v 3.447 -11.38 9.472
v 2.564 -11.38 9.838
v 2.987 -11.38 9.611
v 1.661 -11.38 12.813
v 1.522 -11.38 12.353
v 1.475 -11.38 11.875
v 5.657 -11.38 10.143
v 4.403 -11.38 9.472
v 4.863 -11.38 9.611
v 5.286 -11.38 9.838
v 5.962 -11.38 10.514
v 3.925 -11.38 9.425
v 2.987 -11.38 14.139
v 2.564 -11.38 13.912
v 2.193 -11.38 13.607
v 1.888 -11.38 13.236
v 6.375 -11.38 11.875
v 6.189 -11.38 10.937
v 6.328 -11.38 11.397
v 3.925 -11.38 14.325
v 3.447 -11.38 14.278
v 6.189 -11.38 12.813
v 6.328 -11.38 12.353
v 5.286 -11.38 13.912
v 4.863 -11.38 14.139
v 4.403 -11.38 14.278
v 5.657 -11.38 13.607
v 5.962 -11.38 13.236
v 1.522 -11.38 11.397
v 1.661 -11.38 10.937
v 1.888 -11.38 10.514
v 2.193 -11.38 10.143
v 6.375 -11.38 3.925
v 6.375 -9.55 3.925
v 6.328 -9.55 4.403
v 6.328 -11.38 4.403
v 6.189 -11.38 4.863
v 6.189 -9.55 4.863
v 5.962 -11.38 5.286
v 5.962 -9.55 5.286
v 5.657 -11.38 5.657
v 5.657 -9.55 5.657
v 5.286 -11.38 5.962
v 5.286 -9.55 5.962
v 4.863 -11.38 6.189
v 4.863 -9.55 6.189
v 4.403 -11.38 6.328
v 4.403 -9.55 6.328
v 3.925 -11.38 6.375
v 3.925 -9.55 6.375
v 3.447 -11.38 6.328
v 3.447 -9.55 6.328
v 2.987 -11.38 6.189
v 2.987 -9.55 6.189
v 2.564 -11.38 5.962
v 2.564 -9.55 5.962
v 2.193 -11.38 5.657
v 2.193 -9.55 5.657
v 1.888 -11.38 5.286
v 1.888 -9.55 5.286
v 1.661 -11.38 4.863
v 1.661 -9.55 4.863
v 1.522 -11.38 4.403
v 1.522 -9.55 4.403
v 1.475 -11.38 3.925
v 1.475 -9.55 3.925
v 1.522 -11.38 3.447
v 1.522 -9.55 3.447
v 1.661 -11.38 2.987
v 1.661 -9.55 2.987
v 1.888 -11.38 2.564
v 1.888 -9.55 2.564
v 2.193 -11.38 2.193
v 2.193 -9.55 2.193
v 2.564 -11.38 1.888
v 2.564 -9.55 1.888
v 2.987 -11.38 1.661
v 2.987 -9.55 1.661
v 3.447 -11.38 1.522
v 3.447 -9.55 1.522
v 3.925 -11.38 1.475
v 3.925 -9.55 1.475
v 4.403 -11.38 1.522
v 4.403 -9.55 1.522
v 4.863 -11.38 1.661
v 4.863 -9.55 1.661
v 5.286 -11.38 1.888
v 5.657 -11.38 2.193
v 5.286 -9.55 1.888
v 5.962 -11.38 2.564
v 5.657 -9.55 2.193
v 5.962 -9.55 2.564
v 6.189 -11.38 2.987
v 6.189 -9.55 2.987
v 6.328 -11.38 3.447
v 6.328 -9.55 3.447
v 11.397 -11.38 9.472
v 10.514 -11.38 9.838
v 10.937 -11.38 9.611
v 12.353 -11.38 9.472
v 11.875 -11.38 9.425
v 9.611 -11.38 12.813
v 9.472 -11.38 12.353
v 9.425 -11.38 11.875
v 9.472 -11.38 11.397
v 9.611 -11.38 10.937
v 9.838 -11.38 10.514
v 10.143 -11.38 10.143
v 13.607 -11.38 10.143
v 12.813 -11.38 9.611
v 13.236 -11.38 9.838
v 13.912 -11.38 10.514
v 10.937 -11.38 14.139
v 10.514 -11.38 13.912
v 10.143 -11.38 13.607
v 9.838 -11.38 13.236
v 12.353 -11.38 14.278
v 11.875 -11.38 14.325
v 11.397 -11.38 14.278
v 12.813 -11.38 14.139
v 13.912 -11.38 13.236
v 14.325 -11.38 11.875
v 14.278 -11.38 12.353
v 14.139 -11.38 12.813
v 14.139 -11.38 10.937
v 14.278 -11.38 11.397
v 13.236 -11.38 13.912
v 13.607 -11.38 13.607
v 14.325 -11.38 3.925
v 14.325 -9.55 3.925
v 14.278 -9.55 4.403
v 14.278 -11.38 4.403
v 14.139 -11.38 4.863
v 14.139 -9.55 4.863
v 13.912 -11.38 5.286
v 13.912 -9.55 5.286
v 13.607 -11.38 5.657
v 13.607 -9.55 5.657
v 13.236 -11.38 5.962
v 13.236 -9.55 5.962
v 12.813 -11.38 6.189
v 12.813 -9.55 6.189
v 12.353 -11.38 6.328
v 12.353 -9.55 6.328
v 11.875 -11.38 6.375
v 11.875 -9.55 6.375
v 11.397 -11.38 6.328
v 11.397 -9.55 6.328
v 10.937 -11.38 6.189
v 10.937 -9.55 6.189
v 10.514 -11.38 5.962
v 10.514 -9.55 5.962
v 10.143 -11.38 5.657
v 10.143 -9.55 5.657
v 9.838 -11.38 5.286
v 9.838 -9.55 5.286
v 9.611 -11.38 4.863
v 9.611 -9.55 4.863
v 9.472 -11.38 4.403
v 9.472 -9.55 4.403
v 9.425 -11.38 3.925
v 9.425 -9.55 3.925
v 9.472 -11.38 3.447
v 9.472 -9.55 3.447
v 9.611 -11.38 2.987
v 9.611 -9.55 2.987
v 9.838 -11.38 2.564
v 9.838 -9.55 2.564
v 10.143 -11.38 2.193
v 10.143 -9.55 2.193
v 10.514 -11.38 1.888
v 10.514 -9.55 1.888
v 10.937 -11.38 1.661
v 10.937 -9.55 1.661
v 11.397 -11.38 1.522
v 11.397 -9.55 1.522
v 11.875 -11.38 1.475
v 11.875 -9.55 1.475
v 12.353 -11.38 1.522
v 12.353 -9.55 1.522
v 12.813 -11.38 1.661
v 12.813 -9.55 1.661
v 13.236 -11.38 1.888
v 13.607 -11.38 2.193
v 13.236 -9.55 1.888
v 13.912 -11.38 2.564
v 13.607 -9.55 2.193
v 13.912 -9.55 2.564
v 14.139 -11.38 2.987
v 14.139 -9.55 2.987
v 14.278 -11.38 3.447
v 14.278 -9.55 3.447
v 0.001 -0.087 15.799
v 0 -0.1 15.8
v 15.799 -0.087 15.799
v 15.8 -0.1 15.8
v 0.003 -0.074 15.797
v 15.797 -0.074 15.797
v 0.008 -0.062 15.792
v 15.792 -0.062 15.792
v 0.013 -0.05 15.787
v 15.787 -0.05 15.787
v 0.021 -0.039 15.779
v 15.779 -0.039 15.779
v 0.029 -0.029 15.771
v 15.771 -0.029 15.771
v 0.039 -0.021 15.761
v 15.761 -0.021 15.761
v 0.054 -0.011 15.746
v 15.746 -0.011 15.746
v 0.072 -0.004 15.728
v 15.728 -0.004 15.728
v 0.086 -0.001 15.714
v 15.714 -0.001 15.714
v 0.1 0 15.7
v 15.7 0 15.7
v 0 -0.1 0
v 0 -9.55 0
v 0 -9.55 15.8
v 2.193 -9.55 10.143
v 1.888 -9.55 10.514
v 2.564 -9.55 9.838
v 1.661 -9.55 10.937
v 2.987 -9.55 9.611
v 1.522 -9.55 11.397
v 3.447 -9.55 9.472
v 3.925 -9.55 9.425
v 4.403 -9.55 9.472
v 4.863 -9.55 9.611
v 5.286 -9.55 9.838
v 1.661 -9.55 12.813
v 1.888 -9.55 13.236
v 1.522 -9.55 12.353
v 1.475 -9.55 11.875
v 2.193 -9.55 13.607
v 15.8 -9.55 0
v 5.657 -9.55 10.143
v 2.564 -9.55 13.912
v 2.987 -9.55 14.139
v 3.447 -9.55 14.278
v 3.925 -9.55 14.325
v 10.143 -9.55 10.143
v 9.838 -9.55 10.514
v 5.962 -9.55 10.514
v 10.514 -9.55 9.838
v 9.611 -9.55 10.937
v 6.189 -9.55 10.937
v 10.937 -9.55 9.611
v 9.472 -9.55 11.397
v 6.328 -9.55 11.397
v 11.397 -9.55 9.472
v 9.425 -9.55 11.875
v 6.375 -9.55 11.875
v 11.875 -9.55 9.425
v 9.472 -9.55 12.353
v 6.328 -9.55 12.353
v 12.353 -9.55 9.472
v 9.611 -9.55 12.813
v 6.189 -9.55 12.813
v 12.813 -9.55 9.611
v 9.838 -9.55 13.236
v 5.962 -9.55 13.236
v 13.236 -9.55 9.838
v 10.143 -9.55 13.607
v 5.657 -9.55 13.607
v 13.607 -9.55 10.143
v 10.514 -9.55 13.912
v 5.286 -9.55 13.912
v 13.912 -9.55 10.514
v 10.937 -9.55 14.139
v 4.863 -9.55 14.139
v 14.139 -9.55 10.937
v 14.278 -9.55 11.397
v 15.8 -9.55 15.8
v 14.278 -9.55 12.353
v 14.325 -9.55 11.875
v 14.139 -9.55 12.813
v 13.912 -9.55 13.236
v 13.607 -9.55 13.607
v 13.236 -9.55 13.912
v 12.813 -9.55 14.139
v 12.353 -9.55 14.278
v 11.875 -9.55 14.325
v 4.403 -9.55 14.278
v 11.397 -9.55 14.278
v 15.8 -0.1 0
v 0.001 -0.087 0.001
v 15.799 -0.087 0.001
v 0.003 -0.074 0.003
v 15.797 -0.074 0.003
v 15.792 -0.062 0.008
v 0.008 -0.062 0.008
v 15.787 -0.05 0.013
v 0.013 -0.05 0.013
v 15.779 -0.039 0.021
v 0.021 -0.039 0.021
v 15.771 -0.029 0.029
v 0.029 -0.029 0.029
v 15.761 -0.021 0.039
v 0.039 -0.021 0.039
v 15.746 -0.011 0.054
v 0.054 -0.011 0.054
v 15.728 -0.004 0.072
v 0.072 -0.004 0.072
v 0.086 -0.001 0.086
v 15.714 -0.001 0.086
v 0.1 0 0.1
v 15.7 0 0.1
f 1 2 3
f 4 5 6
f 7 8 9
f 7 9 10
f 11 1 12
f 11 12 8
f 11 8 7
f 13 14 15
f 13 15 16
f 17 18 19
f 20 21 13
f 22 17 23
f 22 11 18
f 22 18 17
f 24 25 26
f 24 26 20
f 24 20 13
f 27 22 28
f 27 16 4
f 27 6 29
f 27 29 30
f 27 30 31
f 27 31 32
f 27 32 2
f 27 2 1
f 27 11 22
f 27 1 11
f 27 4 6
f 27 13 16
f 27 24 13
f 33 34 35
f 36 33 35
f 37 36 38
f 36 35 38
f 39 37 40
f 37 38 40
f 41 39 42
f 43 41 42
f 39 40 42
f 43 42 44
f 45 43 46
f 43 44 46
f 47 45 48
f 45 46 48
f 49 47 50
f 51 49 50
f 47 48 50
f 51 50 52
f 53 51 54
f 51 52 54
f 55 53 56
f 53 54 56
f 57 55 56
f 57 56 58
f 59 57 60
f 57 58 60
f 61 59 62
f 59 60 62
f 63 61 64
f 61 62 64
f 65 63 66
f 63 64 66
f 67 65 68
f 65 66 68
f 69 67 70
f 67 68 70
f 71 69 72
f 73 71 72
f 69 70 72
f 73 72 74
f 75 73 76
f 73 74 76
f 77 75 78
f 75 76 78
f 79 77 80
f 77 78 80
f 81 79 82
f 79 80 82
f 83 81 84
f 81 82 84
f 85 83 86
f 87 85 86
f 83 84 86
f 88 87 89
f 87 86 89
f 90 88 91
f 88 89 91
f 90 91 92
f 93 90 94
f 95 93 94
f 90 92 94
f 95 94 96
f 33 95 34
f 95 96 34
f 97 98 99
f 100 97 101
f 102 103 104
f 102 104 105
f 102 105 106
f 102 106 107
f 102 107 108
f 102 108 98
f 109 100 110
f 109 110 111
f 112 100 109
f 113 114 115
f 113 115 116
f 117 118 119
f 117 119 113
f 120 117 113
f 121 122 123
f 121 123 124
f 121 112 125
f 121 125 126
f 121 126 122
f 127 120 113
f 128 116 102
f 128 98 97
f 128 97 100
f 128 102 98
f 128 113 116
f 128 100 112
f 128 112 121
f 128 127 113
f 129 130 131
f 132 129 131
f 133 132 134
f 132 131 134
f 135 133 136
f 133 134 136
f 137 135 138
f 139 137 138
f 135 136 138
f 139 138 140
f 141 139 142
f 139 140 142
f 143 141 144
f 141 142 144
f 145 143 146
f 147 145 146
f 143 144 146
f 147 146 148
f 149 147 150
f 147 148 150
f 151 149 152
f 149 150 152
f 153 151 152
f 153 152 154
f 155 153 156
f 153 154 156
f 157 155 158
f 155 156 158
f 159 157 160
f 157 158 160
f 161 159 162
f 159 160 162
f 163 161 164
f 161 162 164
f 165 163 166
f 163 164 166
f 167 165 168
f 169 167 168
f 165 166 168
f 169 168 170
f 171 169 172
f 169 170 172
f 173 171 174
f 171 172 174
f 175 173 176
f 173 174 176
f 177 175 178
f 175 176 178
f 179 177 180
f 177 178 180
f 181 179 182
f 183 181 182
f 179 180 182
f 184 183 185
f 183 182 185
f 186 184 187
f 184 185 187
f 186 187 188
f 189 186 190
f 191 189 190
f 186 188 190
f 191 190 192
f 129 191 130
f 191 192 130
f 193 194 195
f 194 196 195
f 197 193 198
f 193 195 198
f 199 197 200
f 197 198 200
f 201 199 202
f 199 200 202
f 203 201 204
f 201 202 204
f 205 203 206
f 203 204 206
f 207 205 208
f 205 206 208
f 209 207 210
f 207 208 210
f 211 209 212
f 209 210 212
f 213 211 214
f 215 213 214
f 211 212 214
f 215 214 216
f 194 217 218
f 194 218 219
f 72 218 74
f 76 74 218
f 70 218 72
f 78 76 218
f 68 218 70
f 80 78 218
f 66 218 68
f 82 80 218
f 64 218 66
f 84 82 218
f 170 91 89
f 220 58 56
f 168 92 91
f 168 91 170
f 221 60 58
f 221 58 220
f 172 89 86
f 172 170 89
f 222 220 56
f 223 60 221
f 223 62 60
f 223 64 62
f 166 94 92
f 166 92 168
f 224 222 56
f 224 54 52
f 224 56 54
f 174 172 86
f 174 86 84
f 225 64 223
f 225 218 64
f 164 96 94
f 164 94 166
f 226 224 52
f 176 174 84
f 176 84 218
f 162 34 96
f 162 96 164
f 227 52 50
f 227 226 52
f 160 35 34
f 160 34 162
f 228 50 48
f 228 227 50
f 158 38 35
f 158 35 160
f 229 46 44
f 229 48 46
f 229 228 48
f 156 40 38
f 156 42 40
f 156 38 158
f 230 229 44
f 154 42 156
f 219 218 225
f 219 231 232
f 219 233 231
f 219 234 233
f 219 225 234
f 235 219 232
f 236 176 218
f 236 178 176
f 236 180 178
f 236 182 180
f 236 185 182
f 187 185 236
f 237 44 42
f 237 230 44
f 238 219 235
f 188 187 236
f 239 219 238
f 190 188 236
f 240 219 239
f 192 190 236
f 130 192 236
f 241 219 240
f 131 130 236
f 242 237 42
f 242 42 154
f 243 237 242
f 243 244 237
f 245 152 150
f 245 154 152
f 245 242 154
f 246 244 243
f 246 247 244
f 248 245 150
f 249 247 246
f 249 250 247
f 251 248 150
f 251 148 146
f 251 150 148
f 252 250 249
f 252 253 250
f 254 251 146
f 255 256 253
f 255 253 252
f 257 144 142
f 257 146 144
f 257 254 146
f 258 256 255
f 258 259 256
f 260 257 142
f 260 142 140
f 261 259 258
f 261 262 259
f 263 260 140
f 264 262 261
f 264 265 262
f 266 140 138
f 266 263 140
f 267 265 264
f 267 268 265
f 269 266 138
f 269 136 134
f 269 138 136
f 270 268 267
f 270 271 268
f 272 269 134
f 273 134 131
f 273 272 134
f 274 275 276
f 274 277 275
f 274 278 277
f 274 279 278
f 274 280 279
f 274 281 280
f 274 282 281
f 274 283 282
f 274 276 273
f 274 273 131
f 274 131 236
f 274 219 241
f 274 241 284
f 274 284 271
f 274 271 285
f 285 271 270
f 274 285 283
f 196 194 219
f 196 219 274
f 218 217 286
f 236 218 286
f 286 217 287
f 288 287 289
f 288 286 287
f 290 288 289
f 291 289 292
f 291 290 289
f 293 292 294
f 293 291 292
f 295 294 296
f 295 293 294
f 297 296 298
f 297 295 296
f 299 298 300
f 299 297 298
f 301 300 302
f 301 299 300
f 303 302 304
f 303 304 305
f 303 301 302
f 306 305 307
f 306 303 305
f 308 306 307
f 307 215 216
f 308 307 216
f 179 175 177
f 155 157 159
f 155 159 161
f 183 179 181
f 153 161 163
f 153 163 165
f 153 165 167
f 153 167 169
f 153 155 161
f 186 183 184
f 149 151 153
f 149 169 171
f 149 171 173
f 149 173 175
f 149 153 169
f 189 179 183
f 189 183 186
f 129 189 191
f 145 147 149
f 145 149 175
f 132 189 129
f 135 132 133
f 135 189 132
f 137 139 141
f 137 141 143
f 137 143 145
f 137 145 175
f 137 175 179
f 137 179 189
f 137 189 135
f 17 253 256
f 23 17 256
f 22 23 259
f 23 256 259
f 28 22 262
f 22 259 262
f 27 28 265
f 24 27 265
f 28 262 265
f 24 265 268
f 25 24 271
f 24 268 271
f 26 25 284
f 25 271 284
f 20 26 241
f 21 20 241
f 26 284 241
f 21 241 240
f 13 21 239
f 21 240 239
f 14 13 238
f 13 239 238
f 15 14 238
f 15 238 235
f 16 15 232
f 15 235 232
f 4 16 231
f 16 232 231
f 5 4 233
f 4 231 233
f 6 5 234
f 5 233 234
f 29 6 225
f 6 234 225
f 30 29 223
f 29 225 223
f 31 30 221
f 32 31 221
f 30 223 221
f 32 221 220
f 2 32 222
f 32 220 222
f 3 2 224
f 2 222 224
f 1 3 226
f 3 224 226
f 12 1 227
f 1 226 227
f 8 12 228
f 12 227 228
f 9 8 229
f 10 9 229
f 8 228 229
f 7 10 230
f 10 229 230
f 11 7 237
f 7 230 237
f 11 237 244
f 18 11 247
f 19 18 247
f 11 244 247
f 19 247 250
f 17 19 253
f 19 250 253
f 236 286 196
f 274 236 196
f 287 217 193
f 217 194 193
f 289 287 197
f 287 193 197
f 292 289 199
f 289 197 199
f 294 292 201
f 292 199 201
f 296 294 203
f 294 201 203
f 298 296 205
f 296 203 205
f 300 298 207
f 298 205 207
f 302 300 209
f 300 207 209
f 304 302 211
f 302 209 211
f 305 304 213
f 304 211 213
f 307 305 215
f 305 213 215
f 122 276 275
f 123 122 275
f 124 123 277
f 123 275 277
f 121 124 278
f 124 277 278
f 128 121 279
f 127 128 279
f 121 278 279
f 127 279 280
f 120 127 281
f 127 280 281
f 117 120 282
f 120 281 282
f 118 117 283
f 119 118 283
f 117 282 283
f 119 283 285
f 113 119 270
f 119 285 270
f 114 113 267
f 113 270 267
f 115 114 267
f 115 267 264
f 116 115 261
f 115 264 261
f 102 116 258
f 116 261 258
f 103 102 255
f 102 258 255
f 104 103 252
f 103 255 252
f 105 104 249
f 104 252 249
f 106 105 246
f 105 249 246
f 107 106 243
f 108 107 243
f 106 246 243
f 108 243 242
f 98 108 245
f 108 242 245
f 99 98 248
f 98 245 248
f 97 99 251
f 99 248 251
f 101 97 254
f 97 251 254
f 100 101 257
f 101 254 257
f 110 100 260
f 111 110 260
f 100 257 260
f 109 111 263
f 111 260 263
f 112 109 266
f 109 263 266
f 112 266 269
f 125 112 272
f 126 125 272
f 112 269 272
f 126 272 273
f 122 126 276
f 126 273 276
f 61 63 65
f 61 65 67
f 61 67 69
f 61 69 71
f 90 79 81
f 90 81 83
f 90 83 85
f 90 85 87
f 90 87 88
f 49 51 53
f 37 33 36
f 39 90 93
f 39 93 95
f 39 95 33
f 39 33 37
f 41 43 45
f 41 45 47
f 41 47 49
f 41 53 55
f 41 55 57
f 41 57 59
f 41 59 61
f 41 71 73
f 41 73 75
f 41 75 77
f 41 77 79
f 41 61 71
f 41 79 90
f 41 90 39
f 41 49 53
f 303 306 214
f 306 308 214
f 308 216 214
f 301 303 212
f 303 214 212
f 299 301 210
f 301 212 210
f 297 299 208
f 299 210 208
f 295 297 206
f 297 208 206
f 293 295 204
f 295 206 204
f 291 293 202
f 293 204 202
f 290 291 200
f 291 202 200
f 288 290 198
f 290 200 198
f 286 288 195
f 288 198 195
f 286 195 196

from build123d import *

# Parameters (mm, degrees)
F0_W     = 15.8
F0_H     = 15.8
F1_DEPTH = 9.55
F2_R     = 2.45
F4_DEPTH = 1.83
F3_R     = 2.45
F6_DEPTH = 1.83
F7_R     = 0.1


with BuildPart() as f1:
    # F0 (on Front) → F1 (new body)
    with BuildSketch(Plane.XZ):
        with Locations((7.9, 7.9)):
            Rectangle(F0_W, F0_H)
    extrude(amount=F1_DEPTH)

    # F2 (on face) → F4 (join)
    with BuildSketch(Plane.XZ.offset(9.55)):
        with Locations((3.925, 11.875)):
            Circle(F2_R)
    extrude(amount=F4_DEPTH)

    # F3 (on face) → F6 (join)
    with BuildSketch(Plane.XZ.offset(9.55)):
        with Locations((11.875, 11.875)):
            Circle(F3_R)
        with Locations((3.925, 3.925)):
            Circle(F3_R)
        with Locations((11.875, 3.925)):
            Circle(F3_R)
    extrude(amount=F6_DEPTH)

    # F7
    f7_edges = [f1.edges().sort_by_distance(p)[0] for p in [
        (7.9, 0, 15.8),
        (0, 0, 7.9),
        (7.9, 0, 0),
        (15.8, 0, 7.9),
    ]]
    fillet(f7_edges, radius=F7_R)


solid = f1.part
